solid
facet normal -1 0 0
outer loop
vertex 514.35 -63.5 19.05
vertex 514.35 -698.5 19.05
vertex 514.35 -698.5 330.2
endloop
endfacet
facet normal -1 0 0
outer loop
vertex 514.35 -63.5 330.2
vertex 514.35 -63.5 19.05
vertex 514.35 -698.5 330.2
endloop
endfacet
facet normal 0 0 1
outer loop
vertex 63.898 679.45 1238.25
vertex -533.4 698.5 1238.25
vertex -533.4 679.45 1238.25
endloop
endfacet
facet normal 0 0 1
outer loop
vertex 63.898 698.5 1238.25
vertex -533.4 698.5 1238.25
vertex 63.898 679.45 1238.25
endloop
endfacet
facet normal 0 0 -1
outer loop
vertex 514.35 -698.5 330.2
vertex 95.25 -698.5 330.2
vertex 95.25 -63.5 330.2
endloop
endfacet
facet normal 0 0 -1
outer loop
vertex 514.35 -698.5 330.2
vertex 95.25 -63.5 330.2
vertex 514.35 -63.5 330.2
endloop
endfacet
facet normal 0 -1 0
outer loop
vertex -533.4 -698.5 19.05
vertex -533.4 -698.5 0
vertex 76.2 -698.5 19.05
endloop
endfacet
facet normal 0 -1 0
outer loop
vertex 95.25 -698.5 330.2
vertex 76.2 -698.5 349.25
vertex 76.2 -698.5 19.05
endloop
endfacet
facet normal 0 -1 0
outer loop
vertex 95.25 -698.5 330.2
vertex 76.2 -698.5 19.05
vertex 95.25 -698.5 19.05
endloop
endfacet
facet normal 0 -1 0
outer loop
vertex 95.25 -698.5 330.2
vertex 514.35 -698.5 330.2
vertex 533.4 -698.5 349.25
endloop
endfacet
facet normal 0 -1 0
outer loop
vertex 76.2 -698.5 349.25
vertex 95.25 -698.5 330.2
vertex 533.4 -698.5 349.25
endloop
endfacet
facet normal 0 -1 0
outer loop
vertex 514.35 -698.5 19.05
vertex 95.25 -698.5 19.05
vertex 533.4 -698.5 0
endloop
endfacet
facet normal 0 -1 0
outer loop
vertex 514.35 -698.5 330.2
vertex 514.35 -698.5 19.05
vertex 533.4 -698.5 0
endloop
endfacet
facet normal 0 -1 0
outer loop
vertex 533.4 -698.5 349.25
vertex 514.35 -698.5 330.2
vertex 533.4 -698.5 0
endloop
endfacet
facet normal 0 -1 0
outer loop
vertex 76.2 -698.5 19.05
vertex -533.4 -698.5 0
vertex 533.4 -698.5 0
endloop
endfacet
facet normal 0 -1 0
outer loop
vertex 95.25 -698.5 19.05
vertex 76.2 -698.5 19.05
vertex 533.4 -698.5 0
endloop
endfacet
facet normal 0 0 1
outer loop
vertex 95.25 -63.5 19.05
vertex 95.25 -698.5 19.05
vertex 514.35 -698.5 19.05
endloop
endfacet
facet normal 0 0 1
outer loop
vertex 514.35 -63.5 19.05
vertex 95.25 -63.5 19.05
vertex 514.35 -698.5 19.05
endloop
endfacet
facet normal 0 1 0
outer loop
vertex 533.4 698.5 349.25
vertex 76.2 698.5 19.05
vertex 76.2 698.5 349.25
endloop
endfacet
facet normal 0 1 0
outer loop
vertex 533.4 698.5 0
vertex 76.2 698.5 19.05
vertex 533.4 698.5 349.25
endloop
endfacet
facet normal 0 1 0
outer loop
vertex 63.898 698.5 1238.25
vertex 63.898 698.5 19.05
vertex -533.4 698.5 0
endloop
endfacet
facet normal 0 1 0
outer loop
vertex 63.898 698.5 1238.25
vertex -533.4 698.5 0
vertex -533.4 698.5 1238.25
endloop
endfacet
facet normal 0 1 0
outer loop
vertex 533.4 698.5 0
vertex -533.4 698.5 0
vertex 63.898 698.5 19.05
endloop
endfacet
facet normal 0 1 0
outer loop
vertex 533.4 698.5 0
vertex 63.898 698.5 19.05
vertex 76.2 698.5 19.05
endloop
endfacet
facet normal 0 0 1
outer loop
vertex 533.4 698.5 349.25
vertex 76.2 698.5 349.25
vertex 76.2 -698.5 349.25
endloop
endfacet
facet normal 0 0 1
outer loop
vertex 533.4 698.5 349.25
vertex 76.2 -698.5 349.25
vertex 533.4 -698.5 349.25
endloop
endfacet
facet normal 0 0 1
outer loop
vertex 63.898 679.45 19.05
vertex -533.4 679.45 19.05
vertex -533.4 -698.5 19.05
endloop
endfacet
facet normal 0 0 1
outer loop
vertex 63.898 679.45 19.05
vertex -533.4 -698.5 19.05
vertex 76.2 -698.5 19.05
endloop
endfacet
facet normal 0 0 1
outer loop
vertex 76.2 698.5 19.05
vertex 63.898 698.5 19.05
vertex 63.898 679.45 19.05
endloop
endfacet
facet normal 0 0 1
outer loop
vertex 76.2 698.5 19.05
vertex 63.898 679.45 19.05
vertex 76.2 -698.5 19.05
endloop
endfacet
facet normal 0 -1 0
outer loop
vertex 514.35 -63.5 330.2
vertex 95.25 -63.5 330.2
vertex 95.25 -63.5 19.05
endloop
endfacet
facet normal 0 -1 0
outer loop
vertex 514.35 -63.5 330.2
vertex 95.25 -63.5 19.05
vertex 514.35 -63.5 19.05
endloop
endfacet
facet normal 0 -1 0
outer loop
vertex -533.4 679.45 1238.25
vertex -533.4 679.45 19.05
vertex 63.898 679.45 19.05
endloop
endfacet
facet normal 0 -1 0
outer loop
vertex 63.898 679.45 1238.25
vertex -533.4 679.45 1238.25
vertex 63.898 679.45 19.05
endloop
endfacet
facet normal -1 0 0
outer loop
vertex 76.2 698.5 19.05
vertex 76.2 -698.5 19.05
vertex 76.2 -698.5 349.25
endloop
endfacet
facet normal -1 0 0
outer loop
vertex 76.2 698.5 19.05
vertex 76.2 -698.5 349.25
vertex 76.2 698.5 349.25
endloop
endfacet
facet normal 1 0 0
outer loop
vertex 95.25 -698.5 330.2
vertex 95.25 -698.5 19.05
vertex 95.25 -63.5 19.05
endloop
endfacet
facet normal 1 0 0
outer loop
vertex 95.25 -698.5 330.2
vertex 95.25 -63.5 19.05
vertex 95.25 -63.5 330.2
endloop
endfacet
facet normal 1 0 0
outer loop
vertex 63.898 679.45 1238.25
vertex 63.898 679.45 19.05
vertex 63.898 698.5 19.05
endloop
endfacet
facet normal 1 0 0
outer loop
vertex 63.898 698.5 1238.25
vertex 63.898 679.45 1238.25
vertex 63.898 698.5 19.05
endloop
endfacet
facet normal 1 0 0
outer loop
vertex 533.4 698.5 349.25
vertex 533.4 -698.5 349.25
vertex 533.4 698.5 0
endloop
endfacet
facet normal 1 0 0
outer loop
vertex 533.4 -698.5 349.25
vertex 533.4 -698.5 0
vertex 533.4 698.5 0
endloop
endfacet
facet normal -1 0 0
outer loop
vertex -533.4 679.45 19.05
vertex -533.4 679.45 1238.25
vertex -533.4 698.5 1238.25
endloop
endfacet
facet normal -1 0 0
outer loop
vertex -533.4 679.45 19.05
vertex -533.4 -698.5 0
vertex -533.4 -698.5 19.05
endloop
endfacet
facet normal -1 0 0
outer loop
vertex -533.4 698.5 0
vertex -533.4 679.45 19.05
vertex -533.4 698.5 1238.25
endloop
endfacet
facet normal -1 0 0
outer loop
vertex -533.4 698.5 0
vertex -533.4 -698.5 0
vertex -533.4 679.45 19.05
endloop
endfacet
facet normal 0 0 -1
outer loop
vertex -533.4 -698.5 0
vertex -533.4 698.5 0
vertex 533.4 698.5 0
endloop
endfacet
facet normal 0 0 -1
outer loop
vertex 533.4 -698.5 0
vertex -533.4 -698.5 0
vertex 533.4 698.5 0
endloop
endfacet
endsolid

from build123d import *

# Parameters (mm, degrees)
F0_W     = 1066.8
F0_H     = 1397
F1_DEPTH = 19.05
F2_W     = 457.2
F2_H     = 1397
F3_DEPTH = 330.2
F4_W     = 597.298336
F4_H     = 19.05
F5_DEPTH = 1219.2
F6_W     = 419.1
F6_H     = 311.15
F7_DEPTH = 635


with BuildPart() as f1:
    # F0 (on Top) → F1 (new body)
    with BuildSketch(Plane.XY):
        Rectangle(F0_W, F0_H)
    extrude(amount=F1_DEPTH)

    # F2 (on face) → F3 (join)
    with BuildSketch(Plane.XY.offset(19.05)):
        with Locations((304.8, 0)):
            Rectangle(F2_W, F2_H)
    extrude(amount=F3_DEPTH)

    # F4 (on face) → F5 (join)
    with BuildSketch(Plane.XY.offset(19.05)):
        with Locations((-234.750832, 688.975)):
            Rectangle(F4_W, F4_H)
    extrude(amount=F5_DEPTH)

    # F6 (on face) → F7 (cut)
    with BuildSketch(Plane.XZ.offset(698.5)):
        with Locations((304.8, 174.625)):
            Rectangle(F6_W, F6_H)
    extrude(amount=-F7_DEPTH, mode=Mode.SUBTRACT)


solid = f1.part
